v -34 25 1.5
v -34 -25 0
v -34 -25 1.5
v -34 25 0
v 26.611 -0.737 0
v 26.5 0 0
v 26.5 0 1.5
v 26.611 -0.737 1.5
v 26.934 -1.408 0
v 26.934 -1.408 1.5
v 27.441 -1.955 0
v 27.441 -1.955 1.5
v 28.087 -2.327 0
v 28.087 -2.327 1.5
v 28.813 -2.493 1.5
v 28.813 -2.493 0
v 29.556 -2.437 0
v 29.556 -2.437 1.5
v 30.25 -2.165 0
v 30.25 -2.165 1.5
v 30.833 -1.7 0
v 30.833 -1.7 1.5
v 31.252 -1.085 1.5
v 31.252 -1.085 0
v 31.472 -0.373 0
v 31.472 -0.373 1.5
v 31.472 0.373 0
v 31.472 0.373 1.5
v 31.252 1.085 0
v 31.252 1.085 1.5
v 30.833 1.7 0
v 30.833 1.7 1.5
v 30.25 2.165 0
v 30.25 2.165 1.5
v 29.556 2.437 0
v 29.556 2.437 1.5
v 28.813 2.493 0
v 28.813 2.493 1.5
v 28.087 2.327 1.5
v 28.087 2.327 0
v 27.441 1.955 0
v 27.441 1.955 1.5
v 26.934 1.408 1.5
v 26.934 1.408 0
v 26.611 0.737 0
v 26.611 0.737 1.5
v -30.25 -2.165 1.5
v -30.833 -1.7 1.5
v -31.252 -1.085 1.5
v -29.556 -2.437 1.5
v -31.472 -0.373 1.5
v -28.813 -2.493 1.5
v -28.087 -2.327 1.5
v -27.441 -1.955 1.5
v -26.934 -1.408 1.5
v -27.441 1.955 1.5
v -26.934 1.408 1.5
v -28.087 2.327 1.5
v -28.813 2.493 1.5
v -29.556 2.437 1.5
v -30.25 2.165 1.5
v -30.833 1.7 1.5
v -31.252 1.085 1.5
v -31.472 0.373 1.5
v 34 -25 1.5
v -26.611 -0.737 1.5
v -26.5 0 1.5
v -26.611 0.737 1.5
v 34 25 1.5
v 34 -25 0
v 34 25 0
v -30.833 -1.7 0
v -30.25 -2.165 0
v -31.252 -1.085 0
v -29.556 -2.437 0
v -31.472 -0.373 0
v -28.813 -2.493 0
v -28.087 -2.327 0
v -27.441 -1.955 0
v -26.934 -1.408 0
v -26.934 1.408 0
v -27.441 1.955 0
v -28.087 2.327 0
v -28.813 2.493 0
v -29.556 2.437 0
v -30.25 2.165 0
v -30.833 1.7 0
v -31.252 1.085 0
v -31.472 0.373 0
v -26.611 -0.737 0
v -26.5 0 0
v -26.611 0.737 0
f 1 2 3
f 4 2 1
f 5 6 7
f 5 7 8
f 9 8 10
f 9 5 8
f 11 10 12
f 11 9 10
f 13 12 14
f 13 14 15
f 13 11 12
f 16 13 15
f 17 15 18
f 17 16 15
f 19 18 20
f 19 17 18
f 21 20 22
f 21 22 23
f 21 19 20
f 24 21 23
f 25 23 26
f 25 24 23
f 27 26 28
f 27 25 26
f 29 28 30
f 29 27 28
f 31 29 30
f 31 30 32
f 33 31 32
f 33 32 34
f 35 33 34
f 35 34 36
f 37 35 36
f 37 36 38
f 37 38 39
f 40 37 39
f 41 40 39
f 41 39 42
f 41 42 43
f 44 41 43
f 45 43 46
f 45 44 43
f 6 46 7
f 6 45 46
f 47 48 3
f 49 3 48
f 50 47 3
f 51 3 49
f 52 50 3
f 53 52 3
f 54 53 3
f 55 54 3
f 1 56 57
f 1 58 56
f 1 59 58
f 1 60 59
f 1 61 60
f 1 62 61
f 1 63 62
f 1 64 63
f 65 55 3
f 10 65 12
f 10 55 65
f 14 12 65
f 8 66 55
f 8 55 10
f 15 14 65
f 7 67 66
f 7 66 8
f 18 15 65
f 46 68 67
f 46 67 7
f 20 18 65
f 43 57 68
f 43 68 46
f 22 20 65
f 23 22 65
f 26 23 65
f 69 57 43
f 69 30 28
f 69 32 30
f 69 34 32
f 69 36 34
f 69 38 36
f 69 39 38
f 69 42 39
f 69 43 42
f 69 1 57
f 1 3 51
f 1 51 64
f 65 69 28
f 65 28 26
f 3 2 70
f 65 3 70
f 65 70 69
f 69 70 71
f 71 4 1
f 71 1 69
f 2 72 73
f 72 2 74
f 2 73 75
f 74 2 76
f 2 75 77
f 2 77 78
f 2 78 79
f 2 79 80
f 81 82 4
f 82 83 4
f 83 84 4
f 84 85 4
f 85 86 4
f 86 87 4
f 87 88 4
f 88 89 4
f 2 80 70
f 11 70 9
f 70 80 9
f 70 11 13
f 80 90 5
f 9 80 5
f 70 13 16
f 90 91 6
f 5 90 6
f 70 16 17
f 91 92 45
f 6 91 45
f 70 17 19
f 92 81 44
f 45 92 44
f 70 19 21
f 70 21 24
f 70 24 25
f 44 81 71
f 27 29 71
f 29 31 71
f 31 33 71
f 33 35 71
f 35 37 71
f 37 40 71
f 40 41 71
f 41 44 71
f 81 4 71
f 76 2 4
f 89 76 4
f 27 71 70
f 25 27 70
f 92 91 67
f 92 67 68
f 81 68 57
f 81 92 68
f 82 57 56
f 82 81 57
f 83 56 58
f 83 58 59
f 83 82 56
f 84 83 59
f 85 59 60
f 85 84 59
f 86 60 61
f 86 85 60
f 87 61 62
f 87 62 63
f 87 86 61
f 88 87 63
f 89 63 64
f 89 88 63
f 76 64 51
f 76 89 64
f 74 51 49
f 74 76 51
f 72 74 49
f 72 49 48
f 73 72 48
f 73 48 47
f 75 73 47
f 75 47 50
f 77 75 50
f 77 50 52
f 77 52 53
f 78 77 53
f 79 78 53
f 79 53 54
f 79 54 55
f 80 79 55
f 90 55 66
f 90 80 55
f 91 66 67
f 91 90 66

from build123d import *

# Parameters (mm, degrees)
SKETCH_1_W      = 68
SKETCH_1_H      = 50
SKETCH_1_R      = 2.5
EXTRUDE_1_DEPTH = 1.5


with BuildPart() as part:
    # ｽｹｯﾁ1 → ﾎﾞｽ - 押し出し1 (new body)
    with BuildSketch(Plane.XY):
        Rectangle(SKETCH_1_W, SKETCH_1_H)
        with Locations((-29, 0)):
            Circle(SKETCH_1_R, mode=Mode.SUBTRACT)
        with Locations(Location((29, 0, 0), (0, 0, 180))):
            Circle(SKETCH_1_R, mode=Mode.SUBTRACT)
    extrude(amount=EXTRUDE_1_DEPTH)


solid = part.part
